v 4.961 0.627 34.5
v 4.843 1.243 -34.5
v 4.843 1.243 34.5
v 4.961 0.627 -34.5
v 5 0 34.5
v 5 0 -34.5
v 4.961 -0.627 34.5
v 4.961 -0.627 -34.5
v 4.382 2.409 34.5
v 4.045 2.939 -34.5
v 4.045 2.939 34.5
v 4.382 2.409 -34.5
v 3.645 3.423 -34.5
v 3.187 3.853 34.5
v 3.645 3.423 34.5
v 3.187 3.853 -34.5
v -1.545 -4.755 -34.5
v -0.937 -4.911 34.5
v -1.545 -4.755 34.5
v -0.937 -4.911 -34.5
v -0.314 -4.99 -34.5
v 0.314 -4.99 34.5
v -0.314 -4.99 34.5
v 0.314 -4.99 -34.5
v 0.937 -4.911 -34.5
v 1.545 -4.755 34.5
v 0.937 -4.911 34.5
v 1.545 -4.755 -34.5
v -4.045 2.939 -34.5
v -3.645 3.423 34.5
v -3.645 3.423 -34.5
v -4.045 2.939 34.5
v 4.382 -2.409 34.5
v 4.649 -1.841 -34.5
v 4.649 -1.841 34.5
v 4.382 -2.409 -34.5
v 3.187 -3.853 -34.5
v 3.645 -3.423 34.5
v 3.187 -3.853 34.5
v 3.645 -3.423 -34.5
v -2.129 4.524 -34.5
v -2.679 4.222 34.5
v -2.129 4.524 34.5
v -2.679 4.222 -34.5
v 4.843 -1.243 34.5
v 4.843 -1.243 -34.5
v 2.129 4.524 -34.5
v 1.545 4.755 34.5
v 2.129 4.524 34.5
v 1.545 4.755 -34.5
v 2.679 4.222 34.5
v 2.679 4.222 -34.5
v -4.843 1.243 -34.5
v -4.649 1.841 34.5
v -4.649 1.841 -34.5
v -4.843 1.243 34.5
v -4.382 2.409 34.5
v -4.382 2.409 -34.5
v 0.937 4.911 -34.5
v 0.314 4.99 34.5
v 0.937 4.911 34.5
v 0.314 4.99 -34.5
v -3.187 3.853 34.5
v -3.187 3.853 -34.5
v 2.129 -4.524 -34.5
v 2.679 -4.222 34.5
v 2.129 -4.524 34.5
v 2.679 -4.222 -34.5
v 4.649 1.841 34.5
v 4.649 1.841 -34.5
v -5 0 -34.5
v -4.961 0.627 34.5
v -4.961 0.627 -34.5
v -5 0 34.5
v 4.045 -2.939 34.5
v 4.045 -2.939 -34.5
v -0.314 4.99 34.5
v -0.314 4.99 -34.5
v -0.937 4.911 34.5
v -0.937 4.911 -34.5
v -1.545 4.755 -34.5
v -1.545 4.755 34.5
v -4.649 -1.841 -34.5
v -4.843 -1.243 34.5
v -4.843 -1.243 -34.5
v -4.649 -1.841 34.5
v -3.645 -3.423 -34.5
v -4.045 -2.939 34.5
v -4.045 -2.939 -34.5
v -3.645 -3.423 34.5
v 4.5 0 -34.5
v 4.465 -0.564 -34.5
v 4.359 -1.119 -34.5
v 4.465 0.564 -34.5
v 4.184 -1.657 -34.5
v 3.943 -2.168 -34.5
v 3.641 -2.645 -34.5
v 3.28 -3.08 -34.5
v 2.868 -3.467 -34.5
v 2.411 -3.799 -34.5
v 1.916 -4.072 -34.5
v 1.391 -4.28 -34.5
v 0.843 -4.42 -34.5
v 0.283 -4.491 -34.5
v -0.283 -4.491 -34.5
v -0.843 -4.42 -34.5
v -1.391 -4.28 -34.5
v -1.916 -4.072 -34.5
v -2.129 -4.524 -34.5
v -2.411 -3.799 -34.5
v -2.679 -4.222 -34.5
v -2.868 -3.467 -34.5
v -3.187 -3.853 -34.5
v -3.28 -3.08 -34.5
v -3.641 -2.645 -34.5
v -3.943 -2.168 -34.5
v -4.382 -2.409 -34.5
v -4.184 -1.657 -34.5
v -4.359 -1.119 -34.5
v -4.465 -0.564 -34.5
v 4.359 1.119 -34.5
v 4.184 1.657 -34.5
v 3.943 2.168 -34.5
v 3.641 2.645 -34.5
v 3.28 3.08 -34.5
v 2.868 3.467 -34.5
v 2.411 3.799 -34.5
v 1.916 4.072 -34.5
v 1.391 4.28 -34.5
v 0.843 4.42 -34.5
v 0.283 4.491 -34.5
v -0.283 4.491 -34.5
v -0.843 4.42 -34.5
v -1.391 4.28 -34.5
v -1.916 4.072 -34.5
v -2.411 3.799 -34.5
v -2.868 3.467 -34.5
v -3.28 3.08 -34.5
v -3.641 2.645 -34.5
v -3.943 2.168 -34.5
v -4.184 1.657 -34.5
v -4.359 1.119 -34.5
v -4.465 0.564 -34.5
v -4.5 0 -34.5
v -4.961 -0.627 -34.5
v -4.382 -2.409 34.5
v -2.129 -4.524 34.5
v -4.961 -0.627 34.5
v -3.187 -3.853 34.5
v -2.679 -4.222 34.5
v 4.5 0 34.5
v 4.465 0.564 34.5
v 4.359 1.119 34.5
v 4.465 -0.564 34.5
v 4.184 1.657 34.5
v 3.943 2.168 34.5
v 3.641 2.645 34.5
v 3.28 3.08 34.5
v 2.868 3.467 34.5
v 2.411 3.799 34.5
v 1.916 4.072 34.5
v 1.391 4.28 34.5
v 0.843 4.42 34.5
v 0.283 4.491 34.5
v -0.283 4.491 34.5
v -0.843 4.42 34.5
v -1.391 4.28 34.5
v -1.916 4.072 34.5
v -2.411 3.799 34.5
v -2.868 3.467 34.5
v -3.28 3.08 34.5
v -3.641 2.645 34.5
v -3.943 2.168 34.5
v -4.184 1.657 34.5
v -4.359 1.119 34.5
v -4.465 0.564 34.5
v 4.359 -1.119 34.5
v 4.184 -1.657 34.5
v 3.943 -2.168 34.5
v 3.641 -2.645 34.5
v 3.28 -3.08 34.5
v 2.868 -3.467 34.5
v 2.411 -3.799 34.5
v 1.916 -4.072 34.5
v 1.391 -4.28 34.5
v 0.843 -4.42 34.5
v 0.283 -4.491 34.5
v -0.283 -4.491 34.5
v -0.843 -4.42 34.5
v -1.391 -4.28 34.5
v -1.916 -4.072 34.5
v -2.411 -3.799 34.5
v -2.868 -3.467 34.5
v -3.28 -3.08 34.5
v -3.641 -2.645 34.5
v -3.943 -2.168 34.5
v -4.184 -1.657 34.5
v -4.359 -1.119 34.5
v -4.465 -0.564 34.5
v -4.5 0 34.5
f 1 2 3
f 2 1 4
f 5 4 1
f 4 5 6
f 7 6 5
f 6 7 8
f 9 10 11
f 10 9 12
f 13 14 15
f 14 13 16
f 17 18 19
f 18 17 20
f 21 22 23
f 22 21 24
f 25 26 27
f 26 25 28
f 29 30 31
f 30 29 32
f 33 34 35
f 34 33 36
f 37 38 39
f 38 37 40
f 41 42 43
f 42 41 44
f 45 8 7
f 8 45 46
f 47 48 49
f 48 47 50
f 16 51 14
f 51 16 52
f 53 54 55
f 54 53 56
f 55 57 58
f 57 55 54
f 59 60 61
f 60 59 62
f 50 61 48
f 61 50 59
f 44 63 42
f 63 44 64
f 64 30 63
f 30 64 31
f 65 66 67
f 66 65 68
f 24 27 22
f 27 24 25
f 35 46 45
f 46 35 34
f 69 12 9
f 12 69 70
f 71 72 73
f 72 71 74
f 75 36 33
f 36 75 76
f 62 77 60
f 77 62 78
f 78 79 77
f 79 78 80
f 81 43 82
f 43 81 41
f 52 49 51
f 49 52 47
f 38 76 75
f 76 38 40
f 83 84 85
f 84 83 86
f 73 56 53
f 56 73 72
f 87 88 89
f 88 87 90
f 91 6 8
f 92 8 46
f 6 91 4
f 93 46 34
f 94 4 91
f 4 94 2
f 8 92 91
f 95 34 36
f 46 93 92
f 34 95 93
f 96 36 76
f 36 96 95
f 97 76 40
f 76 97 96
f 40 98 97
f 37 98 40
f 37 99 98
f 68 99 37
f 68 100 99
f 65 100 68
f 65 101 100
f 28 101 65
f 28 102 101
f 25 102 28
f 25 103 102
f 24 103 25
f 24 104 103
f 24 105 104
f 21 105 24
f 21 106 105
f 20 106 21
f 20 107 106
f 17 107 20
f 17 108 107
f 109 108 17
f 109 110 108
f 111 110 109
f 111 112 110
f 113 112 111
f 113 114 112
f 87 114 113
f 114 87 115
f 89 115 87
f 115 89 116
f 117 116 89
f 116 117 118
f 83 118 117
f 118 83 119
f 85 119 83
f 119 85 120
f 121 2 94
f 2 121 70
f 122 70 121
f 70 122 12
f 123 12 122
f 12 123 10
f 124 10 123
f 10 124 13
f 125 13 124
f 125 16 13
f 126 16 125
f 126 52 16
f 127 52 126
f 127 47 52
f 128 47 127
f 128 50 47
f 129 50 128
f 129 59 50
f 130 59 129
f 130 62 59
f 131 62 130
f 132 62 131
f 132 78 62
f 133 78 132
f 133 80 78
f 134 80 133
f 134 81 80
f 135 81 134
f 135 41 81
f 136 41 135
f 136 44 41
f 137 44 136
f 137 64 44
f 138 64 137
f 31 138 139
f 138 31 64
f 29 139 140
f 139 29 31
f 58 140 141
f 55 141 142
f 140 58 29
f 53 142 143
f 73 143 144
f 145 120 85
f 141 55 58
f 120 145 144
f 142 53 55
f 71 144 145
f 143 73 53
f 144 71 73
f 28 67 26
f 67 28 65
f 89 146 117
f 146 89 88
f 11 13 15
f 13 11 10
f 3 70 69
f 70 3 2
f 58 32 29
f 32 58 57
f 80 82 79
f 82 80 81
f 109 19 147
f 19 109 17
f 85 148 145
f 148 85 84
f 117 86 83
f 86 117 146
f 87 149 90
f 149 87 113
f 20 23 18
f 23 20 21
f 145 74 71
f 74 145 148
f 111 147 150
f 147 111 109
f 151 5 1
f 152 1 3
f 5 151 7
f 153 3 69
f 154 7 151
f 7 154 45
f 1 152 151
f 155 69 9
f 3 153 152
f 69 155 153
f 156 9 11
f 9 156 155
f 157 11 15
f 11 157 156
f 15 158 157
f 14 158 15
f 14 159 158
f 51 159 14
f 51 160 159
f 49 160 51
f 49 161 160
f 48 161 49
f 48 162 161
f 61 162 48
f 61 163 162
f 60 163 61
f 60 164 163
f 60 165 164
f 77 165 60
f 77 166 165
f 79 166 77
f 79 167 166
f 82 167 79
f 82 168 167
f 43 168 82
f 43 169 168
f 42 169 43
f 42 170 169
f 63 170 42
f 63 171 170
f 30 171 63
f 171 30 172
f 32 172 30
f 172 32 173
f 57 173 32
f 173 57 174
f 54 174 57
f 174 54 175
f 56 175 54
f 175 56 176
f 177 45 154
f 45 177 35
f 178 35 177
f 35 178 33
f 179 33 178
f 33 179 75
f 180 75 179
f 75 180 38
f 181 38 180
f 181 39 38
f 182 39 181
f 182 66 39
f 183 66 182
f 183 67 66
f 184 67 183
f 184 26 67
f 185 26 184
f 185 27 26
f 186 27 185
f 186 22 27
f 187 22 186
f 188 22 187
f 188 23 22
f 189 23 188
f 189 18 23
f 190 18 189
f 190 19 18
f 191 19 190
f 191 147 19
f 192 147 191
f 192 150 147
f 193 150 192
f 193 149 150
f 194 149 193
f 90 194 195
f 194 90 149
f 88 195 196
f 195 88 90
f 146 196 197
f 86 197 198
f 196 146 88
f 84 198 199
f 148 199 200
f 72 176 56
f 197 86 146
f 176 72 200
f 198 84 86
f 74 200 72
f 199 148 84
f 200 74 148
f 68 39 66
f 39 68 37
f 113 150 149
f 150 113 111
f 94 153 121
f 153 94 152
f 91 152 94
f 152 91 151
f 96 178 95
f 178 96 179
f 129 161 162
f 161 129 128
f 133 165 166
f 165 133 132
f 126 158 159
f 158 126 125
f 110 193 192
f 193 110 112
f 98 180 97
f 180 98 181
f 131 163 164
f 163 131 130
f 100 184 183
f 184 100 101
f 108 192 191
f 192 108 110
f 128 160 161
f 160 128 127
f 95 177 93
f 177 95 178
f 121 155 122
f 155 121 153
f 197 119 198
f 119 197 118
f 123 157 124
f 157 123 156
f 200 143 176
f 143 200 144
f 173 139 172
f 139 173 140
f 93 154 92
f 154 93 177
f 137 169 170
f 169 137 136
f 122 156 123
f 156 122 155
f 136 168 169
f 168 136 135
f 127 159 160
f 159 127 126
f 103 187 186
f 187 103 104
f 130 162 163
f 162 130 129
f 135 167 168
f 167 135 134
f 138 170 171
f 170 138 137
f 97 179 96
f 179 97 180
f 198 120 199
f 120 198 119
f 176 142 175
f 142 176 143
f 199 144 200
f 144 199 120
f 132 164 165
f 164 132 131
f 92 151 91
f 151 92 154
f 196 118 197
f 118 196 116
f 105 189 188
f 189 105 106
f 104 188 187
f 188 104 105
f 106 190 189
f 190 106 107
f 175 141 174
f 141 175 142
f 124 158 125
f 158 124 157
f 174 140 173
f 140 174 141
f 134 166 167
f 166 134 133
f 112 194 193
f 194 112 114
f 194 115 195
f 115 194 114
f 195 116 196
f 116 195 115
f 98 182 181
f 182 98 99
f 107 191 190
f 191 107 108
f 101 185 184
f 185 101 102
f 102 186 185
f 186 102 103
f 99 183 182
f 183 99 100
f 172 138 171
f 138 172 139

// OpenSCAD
$fn = 50;


difference() {
	union() {
		translate(v = [0, 0, -34.5000000000]) {
			cylinder(h = 69, r = 5.0000000000);
		}
	}
	union() {
		translate(v = [0, 0, -100.0000000000]) {
			cylinder(h = 200, r = 4.5000000000);
		}
	}
}
